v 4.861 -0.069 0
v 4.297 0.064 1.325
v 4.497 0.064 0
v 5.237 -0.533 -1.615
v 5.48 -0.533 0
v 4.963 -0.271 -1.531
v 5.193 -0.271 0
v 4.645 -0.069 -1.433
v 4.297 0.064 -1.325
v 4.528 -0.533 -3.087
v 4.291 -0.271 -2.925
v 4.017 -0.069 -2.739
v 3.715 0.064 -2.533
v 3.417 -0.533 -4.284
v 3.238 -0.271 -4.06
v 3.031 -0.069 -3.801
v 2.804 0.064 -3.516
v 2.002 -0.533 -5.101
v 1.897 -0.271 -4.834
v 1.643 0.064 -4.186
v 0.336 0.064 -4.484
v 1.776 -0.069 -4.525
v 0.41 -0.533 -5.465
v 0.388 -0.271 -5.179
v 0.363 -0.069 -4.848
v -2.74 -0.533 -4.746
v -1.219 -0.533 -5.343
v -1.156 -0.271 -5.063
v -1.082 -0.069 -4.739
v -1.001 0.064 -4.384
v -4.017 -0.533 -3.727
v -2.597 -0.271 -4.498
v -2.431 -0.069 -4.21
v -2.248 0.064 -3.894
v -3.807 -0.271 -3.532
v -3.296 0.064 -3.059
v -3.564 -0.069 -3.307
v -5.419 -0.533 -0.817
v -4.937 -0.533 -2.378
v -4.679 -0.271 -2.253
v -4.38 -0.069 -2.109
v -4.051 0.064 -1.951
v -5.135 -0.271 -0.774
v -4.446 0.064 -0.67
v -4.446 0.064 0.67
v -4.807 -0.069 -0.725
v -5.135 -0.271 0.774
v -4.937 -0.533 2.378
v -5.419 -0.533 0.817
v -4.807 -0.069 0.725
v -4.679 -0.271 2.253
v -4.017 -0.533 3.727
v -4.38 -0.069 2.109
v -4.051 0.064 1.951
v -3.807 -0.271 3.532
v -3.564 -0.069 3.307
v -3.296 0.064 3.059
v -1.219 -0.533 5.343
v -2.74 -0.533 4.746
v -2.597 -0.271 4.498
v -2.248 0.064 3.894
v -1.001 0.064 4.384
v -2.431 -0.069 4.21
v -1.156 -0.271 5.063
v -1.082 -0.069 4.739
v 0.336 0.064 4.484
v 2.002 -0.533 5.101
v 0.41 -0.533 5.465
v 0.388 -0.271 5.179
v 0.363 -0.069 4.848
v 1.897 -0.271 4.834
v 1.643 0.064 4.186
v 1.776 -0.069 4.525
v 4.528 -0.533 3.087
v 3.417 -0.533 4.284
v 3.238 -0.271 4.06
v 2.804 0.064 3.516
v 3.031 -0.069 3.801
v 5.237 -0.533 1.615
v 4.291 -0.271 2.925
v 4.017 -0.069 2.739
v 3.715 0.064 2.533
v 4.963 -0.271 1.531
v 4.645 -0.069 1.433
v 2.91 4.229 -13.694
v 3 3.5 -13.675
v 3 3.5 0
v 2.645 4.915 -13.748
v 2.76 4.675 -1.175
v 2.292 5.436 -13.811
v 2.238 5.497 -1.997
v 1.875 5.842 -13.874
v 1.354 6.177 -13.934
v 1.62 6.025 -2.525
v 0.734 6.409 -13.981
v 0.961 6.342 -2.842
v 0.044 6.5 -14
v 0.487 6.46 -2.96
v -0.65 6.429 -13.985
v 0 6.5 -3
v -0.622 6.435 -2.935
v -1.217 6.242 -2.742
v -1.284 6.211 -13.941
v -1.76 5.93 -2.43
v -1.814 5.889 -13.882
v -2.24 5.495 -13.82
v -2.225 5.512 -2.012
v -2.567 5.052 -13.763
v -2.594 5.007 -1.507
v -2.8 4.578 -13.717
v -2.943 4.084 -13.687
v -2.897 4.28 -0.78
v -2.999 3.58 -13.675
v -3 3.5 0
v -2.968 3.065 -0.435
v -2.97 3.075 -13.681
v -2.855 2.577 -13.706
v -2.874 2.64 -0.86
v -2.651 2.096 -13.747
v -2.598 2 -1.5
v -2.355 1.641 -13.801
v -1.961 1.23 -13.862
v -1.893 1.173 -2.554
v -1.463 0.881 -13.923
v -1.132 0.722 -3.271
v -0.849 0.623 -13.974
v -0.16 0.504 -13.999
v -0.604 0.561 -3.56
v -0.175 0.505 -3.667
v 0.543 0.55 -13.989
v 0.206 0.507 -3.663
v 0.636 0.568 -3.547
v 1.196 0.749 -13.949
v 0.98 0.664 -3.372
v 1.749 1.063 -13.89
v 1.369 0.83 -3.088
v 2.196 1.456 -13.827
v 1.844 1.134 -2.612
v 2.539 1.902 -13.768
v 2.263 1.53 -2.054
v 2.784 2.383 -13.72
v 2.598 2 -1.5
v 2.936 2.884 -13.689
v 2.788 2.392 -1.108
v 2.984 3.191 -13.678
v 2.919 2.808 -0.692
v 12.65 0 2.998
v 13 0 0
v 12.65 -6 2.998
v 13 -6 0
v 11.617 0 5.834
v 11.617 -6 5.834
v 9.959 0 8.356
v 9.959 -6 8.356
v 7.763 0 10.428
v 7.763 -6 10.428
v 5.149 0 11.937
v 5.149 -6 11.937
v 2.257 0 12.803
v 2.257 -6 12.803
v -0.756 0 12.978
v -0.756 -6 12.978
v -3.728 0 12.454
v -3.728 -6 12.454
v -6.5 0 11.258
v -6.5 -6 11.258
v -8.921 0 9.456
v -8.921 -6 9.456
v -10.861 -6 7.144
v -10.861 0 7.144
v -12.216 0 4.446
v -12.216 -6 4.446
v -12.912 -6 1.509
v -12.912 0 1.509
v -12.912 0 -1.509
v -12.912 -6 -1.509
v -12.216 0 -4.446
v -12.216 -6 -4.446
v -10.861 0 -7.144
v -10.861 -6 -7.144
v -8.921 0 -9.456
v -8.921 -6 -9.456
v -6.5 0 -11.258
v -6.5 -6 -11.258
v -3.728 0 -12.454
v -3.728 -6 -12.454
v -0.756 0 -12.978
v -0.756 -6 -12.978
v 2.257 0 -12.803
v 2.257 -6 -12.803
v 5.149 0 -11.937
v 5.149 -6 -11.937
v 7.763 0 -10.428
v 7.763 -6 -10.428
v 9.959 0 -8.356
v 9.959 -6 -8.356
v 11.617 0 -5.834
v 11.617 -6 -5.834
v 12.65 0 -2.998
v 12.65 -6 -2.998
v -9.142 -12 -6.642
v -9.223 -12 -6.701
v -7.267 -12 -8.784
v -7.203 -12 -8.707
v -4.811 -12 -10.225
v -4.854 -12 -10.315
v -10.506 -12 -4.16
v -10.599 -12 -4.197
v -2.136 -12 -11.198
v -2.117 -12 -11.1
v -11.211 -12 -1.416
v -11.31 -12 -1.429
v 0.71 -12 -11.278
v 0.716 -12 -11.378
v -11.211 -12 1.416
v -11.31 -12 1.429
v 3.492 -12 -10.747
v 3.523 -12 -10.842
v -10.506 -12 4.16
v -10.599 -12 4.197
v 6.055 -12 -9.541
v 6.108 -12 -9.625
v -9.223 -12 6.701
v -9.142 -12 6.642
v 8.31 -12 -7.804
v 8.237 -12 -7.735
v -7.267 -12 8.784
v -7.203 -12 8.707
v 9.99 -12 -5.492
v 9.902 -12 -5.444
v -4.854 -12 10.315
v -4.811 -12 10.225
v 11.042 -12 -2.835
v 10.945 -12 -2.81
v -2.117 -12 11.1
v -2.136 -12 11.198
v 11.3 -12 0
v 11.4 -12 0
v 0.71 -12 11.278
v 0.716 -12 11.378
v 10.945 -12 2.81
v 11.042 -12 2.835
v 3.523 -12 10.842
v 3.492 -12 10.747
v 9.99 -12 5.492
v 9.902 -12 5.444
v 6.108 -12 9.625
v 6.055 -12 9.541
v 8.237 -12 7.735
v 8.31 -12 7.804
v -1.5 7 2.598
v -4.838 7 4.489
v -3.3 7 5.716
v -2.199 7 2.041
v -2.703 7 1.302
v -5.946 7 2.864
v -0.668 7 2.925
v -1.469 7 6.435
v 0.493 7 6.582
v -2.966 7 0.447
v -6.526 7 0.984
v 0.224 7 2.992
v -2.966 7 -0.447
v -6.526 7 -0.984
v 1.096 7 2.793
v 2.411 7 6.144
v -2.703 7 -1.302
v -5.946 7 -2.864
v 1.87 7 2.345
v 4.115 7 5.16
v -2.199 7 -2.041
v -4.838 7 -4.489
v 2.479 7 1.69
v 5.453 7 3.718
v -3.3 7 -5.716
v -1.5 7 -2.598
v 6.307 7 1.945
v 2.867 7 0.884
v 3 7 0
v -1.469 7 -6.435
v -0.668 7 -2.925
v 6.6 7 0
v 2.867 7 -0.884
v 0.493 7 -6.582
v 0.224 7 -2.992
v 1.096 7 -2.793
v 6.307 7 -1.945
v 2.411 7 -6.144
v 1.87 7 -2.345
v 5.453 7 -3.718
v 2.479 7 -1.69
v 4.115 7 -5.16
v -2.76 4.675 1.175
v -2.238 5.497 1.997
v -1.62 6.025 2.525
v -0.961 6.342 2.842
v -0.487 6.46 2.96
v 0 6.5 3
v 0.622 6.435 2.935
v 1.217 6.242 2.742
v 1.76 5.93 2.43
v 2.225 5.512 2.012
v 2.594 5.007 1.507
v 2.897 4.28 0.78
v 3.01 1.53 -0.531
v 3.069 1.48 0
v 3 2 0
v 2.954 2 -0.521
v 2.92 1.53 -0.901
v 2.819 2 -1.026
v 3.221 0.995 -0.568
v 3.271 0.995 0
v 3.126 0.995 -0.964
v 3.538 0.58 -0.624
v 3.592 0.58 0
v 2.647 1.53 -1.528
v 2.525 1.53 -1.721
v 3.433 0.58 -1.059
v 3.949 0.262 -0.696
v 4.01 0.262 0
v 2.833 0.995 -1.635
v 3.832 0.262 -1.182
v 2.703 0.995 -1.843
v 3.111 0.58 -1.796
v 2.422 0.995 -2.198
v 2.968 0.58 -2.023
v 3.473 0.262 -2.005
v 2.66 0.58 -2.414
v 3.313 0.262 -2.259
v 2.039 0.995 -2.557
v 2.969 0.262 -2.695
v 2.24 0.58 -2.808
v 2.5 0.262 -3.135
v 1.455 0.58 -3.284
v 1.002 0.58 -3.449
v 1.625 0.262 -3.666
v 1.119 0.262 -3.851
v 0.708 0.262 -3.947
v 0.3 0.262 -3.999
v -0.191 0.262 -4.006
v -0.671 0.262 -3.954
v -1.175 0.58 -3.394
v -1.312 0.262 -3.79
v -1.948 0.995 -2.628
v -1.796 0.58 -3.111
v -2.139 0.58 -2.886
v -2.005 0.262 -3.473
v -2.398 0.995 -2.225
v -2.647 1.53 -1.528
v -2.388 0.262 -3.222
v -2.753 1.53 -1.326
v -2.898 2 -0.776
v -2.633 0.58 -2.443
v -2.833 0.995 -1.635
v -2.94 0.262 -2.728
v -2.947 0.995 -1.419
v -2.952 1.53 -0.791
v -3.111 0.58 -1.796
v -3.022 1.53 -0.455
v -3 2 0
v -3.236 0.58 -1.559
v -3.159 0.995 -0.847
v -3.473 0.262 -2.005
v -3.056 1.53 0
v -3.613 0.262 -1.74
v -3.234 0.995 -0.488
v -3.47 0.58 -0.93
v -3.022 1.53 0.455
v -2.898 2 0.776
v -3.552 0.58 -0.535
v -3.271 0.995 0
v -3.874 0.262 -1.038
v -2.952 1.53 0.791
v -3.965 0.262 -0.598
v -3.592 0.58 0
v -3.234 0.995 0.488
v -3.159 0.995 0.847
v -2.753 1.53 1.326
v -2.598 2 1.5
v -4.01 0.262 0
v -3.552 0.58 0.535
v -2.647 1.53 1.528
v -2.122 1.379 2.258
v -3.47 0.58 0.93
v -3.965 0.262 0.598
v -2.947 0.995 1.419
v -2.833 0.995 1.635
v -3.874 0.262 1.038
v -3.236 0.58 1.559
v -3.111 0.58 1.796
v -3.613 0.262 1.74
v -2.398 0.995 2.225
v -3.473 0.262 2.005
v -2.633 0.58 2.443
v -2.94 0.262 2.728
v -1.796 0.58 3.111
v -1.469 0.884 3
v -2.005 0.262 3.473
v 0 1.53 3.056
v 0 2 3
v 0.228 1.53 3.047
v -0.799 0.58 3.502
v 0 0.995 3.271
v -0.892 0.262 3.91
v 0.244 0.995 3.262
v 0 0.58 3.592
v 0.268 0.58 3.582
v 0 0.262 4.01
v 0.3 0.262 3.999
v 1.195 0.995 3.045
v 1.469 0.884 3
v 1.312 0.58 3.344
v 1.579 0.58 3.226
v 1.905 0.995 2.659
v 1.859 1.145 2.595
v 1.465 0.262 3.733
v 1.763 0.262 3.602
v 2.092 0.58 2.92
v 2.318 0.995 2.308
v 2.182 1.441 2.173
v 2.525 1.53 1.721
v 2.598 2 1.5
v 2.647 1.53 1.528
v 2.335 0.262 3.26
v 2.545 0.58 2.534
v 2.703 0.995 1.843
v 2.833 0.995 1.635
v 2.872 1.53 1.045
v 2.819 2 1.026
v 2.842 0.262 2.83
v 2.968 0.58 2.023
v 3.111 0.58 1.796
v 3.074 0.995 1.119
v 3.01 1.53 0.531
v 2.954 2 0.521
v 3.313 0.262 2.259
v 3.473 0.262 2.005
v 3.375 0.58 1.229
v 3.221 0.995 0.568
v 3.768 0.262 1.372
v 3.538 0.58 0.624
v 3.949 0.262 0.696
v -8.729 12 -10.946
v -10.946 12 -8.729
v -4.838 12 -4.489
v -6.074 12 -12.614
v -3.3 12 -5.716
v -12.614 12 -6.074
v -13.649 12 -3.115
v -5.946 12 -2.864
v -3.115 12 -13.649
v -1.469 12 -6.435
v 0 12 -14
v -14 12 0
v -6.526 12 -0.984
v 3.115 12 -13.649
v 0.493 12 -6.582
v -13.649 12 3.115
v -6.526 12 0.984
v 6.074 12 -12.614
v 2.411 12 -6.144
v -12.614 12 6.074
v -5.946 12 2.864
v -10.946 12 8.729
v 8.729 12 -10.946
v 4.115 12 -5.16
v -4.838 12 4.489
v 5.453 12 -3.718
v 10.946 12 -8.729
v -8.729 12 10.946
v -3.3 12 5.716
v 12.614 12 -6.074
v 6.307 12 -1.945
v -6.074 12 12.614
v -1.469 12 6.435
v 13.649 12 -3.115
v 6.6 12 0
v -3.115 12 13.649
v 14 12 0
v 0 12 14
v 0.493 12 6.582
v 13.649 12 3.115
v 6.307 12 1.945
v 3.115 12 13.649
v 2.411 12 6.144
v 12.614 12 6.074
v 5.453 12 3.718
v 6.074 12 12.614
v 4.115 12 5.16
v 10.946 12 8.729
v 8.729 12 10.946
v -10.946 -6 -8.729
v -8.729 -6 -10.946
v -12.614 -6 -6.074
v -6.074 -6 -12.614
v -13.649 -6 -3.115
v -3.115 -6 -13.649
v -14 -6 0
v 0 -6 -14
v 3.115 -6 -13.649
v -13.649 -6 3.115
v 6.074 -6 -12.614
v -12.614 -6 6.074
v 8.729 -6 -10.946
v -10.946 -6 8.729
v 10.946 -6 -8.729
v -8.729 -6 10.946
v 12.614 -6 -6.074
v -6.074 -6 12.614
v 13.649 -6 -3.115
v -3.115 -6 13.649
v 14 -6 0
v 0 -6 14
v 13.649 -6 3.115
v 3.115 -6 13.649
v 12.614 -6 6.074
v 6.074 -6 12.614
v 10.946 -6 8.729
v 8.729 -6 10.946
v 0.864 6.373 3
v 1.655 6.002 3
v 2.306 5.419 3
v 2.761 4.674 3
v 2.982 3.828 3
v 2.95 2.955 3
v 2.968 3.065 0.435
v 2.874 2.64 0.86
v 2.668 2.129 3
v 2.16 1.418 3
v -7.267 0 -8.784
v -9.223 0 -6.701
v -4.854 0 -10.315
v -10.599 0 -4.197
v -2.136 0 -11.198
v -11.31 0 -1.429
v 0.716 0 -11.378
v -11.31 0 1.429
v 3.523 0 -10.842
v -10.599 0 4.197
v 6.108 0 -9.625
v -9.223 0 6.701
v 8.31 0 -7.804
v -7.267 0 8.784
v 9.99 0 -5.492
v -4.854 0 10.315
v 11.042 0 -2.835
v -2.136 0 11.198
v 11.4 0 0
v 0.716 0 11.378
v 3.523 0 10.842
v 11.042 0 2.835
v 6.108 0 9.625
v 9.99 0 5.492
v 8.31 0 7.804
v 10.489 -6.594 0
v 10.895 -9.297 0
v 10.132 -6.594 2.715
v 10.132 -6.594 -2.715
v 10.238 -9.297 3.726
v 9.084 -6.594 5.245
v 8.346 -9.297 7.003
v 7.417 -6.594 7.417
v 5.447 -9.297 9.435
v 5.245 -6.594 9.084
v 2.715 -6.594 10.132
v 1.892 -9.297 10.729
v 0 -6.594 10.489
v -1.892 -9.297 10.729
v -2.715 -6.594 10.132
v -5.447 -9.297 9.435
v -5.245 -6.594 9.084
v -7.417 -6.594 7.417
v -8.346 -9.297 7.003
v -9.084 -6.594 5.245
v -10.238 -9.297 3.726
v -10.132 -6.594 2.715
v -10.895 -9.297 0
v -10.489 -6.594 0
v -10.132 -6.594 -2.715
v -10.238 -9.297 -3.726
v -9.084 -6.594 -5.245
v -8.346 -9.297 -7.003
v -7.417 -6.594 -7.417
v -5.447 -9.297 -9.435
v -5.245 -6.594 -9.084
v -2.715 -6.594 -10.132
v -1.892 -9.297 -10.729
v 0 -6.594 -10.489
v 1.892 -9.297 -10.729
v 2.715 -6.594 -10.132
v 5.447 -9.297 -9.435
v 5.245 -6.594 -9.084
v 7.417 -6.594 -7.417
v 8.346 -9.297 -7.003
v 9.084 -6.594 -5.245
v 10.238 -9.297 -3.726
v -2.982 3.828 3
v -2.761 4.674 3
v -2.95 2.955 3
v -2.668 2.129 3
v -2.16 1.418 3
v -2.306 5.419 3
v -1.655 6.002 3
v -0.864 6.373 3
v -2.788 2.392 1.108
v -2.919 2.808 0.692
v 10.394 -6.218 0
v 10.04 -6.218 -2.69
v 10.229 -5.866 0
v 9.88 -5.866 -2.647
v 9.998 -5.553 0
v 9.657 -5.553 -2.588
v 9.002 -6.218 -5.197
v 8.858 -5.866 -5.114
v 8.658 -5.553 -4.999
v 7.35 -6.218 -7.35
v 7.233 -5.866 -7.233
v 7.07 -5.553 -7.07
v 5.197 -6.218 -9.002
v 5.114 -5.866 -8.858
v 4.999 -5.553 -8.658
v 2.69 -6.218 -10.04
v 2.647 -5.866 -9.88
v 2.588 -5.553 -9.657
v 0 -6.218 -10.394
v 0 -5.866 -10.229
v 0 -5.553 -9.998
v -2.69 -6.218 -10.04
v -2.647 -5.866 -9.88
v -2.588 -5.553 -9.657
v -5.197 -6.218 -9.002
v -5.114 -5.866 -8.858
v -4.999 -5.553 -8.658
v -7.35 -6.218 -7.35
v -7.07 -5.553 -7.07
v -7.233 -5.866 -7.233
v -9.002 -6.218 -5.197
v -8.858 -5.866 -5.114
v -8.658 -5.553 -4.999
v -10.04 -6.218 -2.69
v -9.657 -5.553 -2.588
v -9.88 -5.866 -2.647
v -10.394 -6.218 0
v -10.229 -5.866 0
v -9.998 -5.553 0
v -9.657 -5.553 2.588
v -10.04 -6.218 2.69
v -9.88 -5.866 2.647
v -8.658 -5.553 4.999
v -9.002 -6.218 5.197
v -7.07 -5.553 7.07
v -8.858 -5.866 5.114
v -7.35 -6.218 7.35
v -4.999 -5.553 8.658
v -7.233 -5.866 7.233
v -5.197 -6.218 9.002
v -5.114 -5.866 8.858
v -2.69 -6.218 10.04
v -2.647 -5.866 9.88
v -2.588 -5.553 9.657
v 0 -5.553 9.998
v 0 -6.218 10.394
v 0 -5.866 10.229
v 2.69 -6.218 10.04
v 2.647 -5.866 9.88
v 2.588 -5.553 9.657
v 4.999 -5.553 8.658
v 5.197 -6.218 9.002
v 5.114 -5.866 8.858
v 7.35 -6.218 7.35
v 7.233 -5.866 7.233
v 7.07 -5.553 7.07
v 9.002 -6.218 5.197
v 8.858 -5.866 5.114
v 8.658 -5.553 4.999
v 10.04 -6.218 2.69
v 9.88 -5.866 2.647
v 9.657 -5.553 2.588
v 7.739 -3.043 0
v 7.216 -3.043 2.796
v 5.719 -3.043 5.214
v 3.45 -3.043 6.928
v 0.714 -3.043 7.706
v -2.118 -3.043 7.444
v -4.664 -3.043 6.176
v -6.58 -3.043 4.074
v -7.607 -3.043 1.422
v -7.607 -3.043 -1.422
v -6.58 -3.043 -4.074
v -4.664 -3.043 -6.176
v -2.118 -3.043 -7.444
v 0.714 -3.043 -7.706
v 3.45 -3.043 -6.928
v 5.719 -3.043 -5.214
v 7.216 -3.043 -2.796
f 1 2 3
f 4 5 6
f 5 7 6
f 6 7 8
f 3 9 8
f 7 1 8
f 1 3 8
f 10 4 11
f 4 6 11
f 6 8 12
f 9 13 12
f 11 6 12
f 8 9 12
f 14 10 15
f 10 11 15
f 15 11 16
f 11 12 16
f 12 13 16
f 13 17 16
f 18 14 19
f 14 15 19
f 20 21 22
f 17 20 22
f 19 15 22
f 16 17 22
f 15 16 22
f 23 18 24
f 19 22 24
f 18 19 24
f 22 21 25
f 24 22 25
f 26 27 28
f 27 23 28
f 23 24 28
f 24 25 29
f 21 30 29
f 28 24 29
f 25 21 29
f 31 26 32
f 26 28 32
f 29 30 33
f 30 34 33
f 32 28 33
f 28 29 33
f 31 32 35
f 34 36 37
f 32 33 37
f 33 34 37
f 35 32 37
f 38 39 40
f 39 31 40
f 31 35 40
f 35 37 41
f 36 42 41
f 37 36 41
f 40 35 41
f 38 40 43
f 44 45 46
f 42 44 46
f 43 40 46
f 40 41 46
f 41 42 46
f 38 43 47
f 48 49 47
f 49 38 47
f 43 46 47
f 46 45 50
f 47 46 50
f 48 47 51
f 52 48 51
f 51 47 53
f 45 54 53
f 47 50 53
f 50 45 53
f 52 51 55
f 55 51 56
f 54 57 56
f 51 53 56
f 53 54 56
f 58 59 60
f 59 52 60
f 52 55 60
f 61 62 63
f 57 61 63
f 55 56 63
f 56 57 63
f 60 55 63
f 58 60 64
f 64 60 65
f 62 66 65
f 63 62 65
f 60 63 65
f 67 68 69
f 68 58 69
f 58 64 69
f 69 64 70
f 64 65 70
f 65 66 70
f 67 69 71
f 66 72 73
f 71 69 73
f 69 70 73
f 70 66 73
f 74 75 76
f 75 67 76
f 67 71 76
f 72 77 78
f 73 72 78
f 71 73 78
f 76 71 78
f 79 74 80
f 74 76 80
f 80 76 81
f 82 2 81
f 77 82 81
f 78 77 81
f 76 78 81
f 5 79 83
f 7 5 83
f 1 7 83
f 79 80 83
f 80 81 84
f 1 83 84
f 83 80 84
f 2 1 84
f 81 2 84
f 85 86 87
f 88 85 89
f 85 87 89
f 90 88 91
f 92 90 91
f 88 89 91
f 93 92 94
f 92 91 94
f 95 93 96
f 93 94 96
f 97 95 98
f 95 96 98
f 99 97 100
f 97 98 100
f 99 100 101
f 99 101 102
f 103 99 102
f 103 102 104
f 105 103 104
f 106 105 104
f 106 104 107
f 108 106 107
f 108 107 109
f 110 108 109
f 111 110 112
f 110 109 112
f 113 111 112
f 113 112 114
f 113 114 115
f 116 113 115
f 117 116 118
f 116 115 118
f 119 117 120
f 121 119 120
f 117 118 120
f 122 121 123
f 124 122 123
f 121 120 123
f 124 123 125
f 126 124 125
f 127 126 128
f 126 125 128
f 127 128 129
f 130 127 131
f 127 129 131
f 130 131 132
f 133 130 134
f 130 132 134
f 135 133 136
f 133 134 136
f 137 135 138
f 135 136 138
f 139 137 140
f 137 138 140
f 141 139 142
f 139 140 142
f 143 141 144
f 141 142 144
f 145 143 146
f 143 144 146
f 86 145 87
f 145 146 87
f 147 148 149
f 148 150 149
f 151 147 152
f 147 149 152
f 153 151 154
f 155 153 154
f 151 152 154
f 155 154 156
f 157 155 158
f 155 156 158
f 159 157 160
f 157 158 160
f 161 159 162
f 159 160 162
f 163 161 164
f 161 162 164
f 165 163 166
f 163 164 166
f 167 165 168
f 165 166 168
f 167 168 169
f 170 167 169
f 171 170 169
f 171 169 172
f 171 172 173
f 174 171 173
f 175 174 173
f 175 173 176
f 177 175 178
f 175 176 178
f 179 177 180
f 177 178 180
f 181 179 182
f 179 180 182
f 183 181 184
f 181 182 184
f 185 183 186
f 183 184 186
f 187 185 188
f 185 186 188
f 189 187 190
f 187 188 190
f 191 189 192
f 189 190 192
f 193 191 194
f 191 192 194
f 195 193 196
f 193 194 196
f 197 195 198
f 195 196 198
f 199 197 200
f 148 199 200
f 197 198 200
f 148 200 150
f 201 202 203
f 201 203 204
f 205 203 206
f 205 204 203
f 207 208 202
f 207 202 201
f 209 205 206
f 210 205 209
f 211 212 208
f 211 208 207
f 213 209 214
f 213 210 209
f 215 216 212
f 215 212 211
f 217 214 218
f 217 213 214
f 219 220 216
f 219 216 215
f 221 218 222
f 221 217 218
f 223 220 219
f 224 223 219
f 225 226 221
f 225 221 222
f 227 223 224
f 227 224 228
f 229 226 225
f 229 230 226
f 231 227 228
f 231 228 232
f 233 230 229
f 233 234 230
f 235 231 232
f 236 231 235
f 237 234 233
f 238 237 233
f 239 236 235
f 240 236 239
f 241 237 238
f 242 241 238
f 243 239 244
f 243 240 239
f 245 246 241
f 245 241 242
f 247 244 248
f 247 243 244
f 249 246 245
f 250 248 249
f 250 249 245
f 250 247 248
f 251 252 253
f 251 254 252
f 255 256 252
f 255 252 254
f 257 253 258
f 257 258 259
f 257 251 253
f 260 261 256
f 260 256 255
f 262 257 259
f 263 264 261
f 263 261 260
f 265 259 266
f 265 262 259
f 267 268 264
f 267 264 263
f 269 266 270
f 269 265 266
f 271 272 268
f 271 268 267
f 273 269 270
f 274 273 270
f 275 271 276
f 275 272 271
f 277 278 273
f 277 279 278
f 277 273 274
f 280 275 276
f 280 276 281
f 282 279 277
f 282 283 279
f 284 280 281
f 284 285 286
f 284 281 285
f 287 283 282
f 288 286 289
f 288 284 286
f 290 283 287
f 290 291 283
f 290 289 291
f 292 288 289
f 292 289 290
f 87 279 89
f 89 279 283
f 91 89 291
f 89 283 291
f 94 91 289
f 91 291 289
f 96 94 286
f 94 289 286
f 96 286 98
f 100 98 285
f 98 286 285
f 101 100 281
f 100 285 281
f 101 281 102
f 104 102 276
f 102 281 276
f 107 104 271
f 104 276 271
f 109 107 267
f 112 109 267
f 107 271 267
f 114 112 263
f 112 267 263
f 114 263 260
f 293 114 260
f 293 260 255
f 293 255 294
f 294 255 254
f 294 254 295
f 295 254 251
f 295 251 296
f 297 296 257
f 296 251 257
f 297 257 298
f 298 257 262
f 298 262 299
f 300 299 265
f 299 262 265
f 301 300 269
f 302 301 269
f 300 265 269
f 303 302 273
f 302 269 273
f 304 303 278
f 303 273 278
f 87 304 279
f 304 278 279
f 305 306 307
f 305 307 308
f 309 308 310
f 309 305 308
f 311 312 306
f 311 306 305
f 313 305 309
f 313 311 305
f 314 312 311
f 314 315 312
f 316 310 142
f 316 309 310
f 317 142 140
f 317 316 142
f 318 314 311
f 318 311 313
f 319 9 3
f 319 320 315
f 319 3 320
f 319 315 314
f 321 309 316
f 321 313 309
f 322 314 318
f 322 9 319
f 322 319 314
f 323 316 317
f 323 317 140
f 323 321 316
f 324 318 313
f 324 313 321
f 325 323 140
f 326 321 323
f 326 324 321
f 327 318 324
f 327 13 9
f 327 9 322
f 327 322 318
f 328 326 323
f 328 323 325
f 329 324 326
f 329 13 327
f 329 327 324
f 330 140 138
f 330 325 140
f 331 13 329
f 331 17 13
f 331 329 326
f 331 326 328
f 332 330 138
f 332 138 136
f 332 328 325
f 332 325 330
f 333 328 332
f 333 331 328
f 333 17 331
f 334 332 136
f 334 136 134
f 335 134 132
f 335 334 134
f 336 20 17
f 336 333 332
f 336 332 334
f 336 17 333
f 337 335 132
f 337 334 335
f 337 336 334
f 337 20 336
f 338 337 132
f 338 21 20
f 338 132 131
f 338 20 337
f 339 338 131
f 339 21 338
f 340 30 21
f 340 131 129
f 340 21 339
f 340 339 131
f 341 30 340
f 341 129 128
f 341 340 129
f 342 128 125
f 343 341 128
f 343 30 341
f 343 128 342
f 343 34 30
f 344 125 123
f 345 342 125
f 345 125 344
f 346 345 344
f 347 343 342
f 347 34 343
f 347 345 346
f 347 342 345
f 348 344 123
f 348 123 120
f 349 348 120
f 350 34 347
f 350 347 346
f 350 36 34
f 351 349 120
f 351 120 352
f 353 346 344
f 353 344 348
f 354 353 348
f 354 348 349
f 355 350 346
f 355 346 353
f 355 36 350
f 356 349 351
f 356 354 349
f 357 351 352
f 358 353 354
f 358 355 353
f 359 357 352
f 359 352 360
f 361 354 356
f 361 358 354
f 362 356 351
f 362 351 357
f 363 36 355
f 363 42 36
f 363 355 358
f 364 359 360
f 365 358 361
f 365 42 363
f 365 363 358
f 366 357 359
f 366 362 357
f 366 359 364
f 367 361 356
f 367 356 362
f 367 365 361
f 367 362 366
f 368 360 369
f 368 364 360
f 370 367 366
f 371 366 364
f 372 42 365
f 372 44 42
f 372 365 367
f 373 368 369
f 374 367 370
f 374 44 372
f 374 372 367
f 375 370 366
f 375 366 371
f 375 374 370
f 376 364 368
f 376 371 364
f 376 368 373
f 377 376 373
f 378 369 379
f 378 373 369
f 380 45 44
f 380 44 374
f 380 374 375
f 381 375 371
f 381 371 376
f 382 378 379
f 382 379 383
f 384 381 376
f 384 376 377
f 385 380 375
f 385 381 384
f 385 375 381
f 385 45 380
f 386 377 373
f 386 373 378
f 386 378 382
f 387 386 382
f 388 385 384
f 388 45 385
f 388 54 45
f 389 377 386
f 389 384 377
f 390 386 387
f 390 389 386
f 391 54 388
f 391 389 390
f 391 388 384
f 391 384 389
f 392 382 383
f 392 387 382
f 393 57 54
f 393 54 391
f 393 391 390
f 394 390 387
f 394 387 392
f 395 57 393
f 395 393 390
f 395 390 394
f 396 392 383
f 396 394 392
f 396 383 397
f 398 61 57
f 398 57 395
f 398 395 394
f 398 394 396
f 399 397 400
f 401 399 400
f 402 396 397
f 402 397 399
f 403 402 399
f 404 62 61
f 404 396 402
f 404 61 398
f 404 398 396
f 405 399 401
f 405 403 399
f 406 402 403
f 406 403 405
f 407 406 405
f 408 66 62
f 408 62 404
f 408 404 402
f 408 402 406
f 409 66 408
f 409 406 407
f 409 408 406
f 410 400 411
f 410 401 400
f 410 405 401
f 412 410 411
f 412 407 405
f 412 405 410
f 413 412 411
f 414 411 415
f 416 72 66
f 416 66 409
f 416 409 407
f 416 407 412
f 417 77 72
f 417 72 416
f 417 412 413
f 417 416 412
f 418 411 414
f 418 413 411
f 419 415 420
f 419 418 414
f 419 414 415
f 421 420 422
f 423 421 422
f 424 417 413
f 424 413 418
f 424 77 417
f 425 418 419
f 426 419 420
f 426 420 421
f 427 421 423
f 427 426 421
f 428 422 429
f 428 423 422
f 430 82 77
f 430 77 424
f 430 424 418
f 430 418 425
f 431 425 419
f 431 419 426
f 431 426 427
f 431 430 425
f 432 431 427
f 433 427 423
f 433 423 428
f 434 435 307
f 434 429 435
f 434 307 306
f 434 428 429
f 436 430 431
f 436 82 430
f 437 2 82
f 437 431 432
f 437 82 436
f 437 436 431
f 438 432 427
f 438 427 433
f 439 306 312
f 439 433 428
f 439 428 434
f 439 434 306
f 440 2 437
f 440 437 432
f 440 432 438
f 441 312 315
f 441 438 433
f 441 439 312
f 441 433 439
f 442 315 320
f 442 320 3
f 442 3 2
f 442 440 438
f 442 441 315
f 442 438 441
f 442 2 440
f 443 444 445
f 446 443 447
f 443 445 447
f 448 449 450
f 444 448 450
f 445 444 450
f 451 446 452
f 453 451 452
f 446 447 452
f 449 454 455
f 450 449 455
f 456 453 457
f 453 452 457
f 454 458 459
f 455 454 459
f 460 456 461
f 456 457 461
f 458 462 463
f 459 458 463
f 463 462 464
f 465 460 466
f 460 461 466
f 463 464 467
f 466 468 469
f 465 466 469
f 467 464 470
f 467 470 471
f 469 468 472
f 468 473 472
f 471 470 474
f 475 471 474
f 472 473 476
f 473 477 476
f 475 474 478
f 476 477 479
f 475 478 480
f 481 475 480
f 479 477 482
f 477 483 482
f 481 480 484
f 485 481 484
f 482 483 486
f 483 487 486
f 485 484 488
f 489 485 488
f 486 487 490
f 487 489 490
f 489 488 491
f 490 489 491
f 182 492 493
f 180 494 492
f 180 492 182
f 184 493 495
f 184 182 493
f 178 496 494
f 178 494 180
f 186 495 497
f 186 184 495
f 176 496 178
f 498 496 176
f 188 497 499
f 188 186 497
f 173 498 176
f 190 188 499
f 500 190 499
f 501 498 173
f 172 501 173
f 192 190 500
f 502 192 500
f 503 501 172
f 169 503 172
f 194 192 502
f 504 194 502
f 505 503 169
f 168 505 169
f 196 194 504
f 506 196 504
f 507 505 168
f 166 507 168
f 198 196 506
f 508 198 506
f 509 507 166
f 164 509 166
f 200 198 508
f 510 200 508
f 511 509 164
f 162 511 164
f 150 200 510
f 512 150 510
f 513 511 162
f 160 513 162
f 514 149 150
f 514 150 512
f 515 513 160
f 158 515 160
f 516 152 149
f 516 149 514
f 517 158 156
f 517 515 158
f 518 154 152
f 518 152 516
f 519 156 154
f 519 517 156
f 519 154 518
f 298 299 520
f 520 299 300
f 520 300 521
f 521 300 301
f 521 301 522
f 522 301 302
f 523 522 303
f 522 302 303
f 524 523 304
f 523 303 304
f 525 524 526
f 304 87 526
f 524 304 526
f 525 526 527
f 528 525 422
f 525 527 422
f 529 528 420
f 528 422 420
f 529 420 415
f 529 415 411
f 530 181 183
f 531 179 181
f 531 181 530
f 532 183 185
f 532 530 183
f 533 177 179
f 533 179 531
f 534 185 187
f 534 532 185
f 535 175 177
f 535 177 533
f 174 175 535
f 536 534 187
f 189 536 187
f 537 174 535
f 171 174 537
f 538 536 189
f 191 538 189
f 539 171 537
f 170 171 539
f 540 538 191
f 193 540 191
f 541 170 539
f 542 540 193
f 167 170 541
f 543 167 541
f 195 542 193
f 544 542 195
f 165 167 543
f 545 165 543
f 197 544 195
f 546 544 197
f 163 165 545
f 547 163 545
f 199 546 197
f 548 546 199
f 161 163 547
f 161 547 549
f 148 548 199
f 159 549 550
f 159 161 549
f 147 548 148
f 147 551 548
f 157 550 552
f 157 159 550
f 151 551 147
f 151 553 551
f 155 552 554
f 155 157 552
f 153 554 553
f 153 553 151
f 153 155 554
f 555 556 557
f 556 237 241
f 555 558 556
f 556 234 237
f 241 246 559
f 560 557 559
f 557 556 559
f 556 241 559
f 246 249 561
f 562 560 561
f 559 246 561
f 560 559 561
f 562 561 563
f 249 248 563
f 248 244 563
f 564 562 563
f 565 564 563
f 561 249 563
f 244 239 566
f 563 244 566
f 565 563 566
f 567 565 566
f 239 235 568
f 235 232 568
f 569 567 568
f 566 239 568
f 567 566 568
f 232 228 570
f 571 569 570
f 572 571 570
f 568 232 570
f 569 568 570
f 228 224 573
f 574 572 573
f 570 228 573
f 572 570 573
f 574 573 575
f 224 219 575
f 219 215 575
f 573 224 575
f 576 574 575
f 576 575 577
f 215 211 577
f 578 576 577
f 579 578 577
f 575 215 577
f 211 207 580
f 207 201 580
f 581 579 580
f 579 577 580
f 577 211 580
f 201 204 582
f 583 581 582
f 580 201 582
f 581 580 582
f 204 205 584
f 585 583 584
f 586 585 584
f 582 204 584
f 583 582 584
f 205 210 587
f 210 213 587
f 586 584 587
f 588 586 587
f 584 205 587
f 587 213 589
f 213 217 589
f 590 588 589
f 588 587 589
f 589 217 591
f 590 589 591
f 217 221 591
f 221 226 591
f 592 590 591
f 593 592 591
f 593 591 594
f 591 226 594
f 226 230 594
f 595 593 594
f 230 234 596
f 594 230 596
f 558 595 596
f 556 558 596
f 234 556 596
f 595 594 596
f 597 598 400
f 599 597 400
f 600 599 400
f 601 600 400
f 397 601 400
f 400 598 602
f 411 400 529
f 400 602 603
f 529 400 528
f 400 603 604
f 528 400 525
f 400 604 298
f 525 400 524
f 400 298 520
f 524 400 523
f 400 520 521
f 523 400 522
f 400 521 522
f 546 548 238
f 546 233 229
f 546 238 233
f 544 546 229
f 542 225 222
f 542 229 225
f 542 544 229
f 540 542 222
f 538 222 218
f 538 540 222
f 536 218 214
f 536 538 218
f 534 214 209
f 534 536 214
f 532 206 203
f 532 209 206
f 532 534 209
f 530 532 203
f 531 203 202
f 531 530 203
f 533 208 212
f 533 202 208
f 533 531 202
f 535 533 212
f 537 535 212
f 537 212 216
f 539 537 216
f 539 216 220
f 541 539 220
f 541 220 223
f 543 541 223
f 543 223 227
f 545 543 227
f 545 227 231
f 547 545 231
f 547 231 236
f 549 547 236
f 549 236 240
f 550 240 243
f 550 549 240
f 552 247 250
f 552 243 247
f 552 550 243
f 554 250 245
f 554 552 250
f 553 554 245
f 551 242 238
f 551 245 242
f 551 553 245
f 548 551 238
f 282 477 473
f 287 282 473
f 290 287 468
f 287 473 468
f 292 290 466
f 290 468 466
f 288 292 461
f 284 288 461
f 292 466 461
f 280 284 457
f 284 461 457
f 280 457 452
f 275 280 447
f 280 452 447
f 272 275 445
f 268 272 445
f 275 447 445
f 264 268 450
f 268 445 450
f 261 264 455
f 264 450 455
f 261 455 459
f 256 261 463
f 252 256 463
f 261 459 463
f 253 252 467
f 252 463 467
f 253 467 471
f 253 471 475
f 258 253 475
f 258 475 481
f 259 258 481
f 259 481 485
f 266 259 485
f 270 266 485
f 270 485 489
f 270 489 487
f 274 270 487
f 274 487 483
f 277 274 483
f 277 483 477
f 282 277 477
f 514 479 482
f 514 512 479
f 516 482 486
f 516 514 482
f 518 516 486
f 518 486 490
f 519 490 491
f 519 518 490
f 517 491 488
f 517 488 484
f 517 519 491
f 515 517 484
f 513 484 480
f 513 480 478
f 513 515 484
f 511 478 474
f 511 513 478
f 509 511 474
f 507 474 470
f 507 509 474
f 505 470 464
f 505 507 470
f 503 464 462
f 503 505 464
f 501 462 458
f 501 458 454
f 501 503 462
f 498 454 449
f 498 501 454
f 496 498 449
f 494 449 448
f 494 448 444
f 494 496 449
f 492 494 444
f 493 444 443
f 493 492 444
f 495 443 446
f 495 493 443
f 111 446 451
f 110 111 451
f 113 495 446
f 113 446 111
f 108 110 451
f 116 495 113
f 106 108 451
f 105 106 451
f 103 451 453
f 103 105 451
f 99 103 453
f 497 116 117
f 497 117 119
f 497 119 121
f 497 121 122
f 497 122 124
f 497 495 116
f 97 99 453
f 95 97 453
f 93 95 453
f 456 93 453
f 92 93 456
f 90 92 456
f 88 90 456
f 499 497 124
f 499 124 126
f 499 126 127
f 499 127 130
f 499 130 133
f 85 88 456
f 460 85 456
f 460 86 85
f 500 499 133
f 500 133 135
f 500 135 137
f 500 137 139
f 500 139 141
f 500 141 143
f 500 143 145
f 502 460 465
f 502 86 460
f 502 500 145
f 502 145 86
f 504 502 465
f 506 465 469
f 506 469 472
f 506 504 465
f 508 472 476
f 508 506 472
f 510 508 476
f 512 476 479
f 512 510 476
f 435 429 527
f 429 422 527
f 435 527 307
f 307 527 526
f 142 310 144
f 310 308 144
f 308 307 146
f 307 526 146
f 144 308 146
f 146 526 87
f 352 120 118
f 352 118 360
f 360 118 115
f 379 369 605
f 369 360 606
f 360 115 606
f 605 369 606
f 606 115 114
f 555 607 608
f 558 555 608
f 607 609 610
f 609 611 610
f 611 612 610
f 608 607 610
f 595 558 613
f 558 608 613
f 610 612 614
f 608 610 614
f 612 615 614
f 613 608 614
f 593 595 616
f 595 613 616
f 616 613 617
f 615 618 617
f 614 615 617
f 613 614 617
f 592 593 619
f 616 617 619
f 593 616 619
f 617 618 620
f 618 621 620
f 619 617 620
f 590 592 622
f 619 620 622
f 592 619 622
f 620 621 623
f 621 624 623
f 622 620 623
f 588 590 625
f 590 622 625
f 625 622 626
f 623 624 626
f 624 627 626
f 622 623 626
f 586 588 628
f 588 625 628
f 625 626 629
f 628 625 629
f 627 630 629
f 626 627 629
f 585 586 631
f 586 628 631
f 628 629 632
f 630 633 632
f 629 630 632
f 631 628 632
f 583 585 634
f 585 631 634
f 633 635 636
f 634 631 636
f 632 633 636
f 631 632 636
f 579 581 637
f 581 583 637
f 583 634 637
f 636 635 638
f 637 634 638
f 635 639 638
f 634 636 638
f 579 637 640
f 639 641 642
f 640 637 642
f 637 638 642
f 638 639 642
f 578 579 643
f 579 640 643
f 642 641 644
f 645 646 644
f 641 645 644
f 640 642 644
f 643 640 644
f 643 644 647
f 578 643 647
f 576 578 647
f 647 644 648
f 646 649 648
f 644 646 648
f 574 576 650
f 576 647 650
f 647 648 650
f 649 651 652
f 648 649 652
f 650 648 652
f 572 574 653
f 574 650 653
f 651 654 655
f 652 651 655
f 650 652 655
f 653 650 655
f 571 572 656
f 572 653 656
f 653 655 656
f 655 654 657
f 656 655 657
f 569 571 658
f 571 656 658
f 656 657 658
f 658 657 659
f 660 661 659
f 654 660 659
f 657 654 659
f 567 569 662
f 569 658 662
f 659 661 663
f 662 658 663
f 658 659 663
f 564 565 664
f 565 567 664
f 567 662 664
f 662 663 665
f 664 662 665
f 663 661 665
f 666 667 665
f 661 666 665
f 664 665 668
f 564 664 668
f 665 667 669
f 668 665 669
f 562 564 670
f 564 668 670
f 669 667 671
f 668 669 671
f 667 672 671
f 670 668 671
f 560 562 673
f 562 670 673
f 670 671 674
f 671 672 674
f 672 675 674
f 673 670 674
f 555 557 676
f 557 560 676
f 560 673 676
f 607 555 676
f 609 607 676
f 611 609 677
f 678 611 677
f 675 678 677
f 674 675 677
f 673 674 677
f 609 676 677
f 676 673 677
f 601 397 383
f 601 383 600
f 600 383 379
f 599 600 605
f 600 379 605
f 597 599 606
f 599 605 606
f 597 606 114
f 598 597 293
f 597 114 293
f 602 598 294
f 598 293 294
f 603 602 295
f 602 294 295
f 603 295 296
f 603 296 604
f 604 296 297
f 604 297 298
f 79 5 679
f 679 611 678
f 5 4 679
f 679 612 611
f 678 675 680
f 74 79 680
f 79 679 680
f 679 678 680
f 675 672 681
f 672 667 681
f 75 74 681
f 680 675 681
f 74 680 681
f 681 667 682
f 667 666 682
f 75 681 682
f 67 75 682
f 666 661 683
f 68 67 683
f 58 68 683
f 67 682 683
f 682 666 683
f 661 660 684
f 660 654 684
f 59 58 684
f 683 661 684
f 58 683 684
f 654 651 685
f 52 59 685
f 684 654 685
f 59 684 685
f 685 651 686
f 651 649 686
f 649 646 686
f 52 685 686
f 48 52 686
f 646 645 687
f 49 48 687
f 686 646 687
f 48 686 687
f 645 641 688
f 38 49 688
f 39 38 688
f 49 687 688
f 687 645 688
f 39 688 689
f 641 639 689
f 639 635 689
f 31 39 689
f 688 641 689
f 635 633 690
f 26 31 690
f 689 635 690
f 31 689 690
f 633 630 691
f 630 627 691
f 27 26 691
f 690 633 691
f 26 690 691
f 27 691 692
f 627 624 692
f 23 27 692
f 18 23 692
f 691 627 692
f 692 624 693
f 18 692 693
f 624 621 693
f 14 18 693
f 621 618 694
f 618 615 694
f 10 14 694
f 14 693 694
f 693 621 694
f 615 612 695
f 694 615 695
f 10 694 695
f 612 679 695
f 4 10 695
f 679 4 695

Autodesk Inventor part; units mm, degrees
ref_plane "YZ Plane" through (0, 0, 0) normal (1, 0, 0) x (0, 1, 0)
ref_plane "XZ Plane" through (0, 0, 0) normal (0, 1, 0) x (-1, 0, 0)
ref_plane "XY Plane" through (0, 0, 0) normal (0, 0, 1) x (1, 0, 0)
sketch "Sketch1" plane through (0, 0, 0) normal (0, 0, 1) x (1, 0, 0)
  line L0 (3, 12) -> (14, 12)
  line L1 (14, 12) -> (14, 0)
  line L2 (3, 2) -> (3, 12)
  line L3 (0, 19.5472) -> (0, -22.4151)
  line L4 (14, 0) -> (13, 0) construction
  line L5 (13, 0) -> (13, -6)
  line L6 (13, -6) -> (14, -6)
  line L7 (14, -6) -> (14, 0)
  line L8 (11.4, 0) -> (10.4, 0) construction
  line L9 (10.4, 0) -> (10.4, -6) construction
  line L10 (10.4, -6) -> (11.4, -6) construction
  line L11 (11.4, -6) -> (11.4, 0)
  line L12 (11.4, -6) -> (11.4, -12)
  line L13 (11.4, -12) -> (11.3, -12)
  line L14 (11.3, -12) -> (10.4892, -6.5945)
  arc A0 (3, 2) -> (4.4967, 0.0644) centre (5, 2) ccw
  line L15 (13, 0) -> (11.4, 0)
  line L16 (10.4, 0) -> (5, 0)
  line L17 (-20.0393, 0) -> (13, 0) construction
  line L18 (14, 0) -> (24.5476, 0) construction
  line L19 (5.48, -0.5334) -> (9.9979, -5.5532)
  arc A1 (10.4892, -6.5945) -> (9.9979, -5.5532) centre (8.5113, -6.8911) ccw
  arc A2 (5.48, -0.5334) -> (4.4967, 0.0644) centre (3.9934, -1.8713) ccw
  point P0 (0, 0)
  point P1 (10.4, 0)
  point P2 (10.5, -6)
  dimension "d0" = 6
  dimension "d2" = 1
  dimension "d4" = 1
  dimension "d5" = 6
  dimension "d6" = 1.6
  dimension "d7" = 26
  dimension "d9" = 6
  dimension "d10" = 0.1
  dimension "d11" = 2
  dimension "d12" = 12
  dimension "d14" = 6
  dimension "d41" = 2
  dimension "d42" = 2
revolve "Revolution1" add sketch "Sketch1" angle 360 about axis through (0, 19.5472, 0) along (0, -1, 0)
sketch "Sketch2" plane through (0, 0, 0) normal (0, 0, 1) x (1, 0, 0)
  line L0 (-3, 12) -> (3, 12) projected
  line L1 (0, 12) -> (0, 0) construction
  line L2 (-3, 2) -> (3, 2) construction
  circle A0 centre (0, 3.5) radius 3
  line L3 (-13, 0) -> (13, 0) construction
  point P0 (2.5981, 2)
  point P1 (-2.5981, 2)
  dimension "d16" = 6
  dimension "d43" = 3.5
extrude "Extrusion1" cut sketch "Sketch2" along normal blind 3 and the other way blind 19.5
sketch "Sketch4" plane through (0, 12, 0) normal (0, 1, 0) x (1, 0, 0)
  circle A0 centre (0, 0) radius 6.6
  dimension "d38" = 13.2
extrude "Extrusion3" cut sketch "Sketch4" against normal blind 5
sketch "Sketch3" plane through (0, 12, 0) normal (0, 1, 0) x (1, 0, 0)
  circle A0 centre (-5.25, 0) radius 0.45
  line L0 (0, 0) -> (-14, 0) construction
  circle A1 centre (0, 0) radius 14 construction
  circle A2 centre (-7.5, 0) radius 0.45
  circle A3 centre (0, 0) radius 3 construction
  arc A4 (-2.5981, 1.5) -> (-2.5981, -1.5) centre (0, 0) ccw construction
  circle A5 centre (-6.4952, -3.75) radius 0.45
  circle A6 centre (-4.5466, -2.625) radius 0.45
  circle A7 centre (-3.75, -6.4952) radius 0.45
  circle A8 centre (-2.625, -4.5466) radius 0.45
  circle A9 centre (0, -7.5) radius 0.45
  circle A10 centre (0, -5.25) radius 0.45
  circle A11 centre (3.75, -6.4952) radius 0.45
  circle A12 centre (2.625, -4.5466) radius 0.45
  circle A13 centre (6.4952, -3.75) radius 0.45
  circle A14 centre (4.5466, -2.625) radius 0.45
  circle A15 centre (7.5, 0) radius 0.45
  circle A16 centre (5.25, 0) radius 0.45
  circle A17 centre (6.4952, 3.75) radius 0.45
  circle A18 centre (4.5466, 2.625) radius 0.45
  circle A19 centre (3.75, 6.4952) radius 0.45
  circle A20 centre (2.625, 4.5466) radius 0.45
  circle A21 centre (0, 7.5) radius 0.45
  circle A22 centre (0, 5.25) radius 0.45
  circle A23 centre (-3.75, 6.4952) radius 0.45
  circle A24 centre (-2.625, 4.5466) radius 0.45
  circle A25 centre (-6.4952, 3.75) radius 0.45
  circle A26 centre (-4.5466, 2.625) radius 0.45
  point P0 (-3, 0)
  point P1 (-3, 0)
  dimension "d22" = 0.9
  dimension "d24" = 0.9
  dimension "d30" = 2.25
  dimension "d31" = 2.25
  dimension "d34" = 360
equation "\"d0\" = t_D"
equation "\"d2\" = w_th"
equation "\"d4\" = w_th"
equation "\"d5\" = w_l"
equation "\"d6\" = lv_th"
equation "\"d7\" = lv_OD"
equation "\"d9\" = w_l"
equation "\"d10\" = tol"
equation "\"d11\" = fillet_D"
equation "\"d12\" = top_th_f"
equation "\"d14\" = w_l"
equation "\"d41\" = fillet_D"
equation "\"d42\" = fillet_D"
equation "\"d16\" = t_D"
equation "\"d43\" = 0.5 * w_th + 0.5 * t_D"
equation "\"d18\" = 0.5 * t_D"
equation "\"d19\" = 0.75 * lv_OD"
equation "\"d38\" = cn_D"
equation "\"d39\" = cn_h"
equation "\"d22\" = h_D"
equation "\"d24\" = h_D"
equation "\"d30\" = h_s"
equation "\"d31\" = h_s"
equation "\"tol\" = 0.1"
equation "\"fillet_D\" = 2"
equation "\"w_th\" = 1"
equation "\"w_l\" = 6"
equation "\"t_D\" = 6"
equation "\"t_D_f\" = t_D + w_th"
equation "\"top_th_f\" = t_D_f + cn_h"
equation "\"cn_h\" = 5"
equation "\"lv_OD\" = 26"
equation "\"lv_th\" = 1.6"
equation "\"d3\" = w_l"
equation "\"d8\" = top_th_f"
equation "\"top_th\" = t_D + w_th"
equation "\"sv_OD\" = 13"
equation "\"sv_th\" = 1.5"
equation "\"b_OD\" = 44"
equation "\"b_th\" = 1.5"
equation "\"b_ID\" = 36.5"
equation "\"b_rim_h\" = 5"
equation "\"h_s\" = 2.25"
equation "\"h_D\" = 0.9"
equation "\"d25\" = 2 * d26"
equation "\"v_h_D\" = 7.5"
equation "\"v_h_off\" = 0.5 * cn_D + 0.5 * v_h_D"
equation "\"cn_D\" = 13.2"
equation "\"d26\" = 0.1"
properties part number "vial"
